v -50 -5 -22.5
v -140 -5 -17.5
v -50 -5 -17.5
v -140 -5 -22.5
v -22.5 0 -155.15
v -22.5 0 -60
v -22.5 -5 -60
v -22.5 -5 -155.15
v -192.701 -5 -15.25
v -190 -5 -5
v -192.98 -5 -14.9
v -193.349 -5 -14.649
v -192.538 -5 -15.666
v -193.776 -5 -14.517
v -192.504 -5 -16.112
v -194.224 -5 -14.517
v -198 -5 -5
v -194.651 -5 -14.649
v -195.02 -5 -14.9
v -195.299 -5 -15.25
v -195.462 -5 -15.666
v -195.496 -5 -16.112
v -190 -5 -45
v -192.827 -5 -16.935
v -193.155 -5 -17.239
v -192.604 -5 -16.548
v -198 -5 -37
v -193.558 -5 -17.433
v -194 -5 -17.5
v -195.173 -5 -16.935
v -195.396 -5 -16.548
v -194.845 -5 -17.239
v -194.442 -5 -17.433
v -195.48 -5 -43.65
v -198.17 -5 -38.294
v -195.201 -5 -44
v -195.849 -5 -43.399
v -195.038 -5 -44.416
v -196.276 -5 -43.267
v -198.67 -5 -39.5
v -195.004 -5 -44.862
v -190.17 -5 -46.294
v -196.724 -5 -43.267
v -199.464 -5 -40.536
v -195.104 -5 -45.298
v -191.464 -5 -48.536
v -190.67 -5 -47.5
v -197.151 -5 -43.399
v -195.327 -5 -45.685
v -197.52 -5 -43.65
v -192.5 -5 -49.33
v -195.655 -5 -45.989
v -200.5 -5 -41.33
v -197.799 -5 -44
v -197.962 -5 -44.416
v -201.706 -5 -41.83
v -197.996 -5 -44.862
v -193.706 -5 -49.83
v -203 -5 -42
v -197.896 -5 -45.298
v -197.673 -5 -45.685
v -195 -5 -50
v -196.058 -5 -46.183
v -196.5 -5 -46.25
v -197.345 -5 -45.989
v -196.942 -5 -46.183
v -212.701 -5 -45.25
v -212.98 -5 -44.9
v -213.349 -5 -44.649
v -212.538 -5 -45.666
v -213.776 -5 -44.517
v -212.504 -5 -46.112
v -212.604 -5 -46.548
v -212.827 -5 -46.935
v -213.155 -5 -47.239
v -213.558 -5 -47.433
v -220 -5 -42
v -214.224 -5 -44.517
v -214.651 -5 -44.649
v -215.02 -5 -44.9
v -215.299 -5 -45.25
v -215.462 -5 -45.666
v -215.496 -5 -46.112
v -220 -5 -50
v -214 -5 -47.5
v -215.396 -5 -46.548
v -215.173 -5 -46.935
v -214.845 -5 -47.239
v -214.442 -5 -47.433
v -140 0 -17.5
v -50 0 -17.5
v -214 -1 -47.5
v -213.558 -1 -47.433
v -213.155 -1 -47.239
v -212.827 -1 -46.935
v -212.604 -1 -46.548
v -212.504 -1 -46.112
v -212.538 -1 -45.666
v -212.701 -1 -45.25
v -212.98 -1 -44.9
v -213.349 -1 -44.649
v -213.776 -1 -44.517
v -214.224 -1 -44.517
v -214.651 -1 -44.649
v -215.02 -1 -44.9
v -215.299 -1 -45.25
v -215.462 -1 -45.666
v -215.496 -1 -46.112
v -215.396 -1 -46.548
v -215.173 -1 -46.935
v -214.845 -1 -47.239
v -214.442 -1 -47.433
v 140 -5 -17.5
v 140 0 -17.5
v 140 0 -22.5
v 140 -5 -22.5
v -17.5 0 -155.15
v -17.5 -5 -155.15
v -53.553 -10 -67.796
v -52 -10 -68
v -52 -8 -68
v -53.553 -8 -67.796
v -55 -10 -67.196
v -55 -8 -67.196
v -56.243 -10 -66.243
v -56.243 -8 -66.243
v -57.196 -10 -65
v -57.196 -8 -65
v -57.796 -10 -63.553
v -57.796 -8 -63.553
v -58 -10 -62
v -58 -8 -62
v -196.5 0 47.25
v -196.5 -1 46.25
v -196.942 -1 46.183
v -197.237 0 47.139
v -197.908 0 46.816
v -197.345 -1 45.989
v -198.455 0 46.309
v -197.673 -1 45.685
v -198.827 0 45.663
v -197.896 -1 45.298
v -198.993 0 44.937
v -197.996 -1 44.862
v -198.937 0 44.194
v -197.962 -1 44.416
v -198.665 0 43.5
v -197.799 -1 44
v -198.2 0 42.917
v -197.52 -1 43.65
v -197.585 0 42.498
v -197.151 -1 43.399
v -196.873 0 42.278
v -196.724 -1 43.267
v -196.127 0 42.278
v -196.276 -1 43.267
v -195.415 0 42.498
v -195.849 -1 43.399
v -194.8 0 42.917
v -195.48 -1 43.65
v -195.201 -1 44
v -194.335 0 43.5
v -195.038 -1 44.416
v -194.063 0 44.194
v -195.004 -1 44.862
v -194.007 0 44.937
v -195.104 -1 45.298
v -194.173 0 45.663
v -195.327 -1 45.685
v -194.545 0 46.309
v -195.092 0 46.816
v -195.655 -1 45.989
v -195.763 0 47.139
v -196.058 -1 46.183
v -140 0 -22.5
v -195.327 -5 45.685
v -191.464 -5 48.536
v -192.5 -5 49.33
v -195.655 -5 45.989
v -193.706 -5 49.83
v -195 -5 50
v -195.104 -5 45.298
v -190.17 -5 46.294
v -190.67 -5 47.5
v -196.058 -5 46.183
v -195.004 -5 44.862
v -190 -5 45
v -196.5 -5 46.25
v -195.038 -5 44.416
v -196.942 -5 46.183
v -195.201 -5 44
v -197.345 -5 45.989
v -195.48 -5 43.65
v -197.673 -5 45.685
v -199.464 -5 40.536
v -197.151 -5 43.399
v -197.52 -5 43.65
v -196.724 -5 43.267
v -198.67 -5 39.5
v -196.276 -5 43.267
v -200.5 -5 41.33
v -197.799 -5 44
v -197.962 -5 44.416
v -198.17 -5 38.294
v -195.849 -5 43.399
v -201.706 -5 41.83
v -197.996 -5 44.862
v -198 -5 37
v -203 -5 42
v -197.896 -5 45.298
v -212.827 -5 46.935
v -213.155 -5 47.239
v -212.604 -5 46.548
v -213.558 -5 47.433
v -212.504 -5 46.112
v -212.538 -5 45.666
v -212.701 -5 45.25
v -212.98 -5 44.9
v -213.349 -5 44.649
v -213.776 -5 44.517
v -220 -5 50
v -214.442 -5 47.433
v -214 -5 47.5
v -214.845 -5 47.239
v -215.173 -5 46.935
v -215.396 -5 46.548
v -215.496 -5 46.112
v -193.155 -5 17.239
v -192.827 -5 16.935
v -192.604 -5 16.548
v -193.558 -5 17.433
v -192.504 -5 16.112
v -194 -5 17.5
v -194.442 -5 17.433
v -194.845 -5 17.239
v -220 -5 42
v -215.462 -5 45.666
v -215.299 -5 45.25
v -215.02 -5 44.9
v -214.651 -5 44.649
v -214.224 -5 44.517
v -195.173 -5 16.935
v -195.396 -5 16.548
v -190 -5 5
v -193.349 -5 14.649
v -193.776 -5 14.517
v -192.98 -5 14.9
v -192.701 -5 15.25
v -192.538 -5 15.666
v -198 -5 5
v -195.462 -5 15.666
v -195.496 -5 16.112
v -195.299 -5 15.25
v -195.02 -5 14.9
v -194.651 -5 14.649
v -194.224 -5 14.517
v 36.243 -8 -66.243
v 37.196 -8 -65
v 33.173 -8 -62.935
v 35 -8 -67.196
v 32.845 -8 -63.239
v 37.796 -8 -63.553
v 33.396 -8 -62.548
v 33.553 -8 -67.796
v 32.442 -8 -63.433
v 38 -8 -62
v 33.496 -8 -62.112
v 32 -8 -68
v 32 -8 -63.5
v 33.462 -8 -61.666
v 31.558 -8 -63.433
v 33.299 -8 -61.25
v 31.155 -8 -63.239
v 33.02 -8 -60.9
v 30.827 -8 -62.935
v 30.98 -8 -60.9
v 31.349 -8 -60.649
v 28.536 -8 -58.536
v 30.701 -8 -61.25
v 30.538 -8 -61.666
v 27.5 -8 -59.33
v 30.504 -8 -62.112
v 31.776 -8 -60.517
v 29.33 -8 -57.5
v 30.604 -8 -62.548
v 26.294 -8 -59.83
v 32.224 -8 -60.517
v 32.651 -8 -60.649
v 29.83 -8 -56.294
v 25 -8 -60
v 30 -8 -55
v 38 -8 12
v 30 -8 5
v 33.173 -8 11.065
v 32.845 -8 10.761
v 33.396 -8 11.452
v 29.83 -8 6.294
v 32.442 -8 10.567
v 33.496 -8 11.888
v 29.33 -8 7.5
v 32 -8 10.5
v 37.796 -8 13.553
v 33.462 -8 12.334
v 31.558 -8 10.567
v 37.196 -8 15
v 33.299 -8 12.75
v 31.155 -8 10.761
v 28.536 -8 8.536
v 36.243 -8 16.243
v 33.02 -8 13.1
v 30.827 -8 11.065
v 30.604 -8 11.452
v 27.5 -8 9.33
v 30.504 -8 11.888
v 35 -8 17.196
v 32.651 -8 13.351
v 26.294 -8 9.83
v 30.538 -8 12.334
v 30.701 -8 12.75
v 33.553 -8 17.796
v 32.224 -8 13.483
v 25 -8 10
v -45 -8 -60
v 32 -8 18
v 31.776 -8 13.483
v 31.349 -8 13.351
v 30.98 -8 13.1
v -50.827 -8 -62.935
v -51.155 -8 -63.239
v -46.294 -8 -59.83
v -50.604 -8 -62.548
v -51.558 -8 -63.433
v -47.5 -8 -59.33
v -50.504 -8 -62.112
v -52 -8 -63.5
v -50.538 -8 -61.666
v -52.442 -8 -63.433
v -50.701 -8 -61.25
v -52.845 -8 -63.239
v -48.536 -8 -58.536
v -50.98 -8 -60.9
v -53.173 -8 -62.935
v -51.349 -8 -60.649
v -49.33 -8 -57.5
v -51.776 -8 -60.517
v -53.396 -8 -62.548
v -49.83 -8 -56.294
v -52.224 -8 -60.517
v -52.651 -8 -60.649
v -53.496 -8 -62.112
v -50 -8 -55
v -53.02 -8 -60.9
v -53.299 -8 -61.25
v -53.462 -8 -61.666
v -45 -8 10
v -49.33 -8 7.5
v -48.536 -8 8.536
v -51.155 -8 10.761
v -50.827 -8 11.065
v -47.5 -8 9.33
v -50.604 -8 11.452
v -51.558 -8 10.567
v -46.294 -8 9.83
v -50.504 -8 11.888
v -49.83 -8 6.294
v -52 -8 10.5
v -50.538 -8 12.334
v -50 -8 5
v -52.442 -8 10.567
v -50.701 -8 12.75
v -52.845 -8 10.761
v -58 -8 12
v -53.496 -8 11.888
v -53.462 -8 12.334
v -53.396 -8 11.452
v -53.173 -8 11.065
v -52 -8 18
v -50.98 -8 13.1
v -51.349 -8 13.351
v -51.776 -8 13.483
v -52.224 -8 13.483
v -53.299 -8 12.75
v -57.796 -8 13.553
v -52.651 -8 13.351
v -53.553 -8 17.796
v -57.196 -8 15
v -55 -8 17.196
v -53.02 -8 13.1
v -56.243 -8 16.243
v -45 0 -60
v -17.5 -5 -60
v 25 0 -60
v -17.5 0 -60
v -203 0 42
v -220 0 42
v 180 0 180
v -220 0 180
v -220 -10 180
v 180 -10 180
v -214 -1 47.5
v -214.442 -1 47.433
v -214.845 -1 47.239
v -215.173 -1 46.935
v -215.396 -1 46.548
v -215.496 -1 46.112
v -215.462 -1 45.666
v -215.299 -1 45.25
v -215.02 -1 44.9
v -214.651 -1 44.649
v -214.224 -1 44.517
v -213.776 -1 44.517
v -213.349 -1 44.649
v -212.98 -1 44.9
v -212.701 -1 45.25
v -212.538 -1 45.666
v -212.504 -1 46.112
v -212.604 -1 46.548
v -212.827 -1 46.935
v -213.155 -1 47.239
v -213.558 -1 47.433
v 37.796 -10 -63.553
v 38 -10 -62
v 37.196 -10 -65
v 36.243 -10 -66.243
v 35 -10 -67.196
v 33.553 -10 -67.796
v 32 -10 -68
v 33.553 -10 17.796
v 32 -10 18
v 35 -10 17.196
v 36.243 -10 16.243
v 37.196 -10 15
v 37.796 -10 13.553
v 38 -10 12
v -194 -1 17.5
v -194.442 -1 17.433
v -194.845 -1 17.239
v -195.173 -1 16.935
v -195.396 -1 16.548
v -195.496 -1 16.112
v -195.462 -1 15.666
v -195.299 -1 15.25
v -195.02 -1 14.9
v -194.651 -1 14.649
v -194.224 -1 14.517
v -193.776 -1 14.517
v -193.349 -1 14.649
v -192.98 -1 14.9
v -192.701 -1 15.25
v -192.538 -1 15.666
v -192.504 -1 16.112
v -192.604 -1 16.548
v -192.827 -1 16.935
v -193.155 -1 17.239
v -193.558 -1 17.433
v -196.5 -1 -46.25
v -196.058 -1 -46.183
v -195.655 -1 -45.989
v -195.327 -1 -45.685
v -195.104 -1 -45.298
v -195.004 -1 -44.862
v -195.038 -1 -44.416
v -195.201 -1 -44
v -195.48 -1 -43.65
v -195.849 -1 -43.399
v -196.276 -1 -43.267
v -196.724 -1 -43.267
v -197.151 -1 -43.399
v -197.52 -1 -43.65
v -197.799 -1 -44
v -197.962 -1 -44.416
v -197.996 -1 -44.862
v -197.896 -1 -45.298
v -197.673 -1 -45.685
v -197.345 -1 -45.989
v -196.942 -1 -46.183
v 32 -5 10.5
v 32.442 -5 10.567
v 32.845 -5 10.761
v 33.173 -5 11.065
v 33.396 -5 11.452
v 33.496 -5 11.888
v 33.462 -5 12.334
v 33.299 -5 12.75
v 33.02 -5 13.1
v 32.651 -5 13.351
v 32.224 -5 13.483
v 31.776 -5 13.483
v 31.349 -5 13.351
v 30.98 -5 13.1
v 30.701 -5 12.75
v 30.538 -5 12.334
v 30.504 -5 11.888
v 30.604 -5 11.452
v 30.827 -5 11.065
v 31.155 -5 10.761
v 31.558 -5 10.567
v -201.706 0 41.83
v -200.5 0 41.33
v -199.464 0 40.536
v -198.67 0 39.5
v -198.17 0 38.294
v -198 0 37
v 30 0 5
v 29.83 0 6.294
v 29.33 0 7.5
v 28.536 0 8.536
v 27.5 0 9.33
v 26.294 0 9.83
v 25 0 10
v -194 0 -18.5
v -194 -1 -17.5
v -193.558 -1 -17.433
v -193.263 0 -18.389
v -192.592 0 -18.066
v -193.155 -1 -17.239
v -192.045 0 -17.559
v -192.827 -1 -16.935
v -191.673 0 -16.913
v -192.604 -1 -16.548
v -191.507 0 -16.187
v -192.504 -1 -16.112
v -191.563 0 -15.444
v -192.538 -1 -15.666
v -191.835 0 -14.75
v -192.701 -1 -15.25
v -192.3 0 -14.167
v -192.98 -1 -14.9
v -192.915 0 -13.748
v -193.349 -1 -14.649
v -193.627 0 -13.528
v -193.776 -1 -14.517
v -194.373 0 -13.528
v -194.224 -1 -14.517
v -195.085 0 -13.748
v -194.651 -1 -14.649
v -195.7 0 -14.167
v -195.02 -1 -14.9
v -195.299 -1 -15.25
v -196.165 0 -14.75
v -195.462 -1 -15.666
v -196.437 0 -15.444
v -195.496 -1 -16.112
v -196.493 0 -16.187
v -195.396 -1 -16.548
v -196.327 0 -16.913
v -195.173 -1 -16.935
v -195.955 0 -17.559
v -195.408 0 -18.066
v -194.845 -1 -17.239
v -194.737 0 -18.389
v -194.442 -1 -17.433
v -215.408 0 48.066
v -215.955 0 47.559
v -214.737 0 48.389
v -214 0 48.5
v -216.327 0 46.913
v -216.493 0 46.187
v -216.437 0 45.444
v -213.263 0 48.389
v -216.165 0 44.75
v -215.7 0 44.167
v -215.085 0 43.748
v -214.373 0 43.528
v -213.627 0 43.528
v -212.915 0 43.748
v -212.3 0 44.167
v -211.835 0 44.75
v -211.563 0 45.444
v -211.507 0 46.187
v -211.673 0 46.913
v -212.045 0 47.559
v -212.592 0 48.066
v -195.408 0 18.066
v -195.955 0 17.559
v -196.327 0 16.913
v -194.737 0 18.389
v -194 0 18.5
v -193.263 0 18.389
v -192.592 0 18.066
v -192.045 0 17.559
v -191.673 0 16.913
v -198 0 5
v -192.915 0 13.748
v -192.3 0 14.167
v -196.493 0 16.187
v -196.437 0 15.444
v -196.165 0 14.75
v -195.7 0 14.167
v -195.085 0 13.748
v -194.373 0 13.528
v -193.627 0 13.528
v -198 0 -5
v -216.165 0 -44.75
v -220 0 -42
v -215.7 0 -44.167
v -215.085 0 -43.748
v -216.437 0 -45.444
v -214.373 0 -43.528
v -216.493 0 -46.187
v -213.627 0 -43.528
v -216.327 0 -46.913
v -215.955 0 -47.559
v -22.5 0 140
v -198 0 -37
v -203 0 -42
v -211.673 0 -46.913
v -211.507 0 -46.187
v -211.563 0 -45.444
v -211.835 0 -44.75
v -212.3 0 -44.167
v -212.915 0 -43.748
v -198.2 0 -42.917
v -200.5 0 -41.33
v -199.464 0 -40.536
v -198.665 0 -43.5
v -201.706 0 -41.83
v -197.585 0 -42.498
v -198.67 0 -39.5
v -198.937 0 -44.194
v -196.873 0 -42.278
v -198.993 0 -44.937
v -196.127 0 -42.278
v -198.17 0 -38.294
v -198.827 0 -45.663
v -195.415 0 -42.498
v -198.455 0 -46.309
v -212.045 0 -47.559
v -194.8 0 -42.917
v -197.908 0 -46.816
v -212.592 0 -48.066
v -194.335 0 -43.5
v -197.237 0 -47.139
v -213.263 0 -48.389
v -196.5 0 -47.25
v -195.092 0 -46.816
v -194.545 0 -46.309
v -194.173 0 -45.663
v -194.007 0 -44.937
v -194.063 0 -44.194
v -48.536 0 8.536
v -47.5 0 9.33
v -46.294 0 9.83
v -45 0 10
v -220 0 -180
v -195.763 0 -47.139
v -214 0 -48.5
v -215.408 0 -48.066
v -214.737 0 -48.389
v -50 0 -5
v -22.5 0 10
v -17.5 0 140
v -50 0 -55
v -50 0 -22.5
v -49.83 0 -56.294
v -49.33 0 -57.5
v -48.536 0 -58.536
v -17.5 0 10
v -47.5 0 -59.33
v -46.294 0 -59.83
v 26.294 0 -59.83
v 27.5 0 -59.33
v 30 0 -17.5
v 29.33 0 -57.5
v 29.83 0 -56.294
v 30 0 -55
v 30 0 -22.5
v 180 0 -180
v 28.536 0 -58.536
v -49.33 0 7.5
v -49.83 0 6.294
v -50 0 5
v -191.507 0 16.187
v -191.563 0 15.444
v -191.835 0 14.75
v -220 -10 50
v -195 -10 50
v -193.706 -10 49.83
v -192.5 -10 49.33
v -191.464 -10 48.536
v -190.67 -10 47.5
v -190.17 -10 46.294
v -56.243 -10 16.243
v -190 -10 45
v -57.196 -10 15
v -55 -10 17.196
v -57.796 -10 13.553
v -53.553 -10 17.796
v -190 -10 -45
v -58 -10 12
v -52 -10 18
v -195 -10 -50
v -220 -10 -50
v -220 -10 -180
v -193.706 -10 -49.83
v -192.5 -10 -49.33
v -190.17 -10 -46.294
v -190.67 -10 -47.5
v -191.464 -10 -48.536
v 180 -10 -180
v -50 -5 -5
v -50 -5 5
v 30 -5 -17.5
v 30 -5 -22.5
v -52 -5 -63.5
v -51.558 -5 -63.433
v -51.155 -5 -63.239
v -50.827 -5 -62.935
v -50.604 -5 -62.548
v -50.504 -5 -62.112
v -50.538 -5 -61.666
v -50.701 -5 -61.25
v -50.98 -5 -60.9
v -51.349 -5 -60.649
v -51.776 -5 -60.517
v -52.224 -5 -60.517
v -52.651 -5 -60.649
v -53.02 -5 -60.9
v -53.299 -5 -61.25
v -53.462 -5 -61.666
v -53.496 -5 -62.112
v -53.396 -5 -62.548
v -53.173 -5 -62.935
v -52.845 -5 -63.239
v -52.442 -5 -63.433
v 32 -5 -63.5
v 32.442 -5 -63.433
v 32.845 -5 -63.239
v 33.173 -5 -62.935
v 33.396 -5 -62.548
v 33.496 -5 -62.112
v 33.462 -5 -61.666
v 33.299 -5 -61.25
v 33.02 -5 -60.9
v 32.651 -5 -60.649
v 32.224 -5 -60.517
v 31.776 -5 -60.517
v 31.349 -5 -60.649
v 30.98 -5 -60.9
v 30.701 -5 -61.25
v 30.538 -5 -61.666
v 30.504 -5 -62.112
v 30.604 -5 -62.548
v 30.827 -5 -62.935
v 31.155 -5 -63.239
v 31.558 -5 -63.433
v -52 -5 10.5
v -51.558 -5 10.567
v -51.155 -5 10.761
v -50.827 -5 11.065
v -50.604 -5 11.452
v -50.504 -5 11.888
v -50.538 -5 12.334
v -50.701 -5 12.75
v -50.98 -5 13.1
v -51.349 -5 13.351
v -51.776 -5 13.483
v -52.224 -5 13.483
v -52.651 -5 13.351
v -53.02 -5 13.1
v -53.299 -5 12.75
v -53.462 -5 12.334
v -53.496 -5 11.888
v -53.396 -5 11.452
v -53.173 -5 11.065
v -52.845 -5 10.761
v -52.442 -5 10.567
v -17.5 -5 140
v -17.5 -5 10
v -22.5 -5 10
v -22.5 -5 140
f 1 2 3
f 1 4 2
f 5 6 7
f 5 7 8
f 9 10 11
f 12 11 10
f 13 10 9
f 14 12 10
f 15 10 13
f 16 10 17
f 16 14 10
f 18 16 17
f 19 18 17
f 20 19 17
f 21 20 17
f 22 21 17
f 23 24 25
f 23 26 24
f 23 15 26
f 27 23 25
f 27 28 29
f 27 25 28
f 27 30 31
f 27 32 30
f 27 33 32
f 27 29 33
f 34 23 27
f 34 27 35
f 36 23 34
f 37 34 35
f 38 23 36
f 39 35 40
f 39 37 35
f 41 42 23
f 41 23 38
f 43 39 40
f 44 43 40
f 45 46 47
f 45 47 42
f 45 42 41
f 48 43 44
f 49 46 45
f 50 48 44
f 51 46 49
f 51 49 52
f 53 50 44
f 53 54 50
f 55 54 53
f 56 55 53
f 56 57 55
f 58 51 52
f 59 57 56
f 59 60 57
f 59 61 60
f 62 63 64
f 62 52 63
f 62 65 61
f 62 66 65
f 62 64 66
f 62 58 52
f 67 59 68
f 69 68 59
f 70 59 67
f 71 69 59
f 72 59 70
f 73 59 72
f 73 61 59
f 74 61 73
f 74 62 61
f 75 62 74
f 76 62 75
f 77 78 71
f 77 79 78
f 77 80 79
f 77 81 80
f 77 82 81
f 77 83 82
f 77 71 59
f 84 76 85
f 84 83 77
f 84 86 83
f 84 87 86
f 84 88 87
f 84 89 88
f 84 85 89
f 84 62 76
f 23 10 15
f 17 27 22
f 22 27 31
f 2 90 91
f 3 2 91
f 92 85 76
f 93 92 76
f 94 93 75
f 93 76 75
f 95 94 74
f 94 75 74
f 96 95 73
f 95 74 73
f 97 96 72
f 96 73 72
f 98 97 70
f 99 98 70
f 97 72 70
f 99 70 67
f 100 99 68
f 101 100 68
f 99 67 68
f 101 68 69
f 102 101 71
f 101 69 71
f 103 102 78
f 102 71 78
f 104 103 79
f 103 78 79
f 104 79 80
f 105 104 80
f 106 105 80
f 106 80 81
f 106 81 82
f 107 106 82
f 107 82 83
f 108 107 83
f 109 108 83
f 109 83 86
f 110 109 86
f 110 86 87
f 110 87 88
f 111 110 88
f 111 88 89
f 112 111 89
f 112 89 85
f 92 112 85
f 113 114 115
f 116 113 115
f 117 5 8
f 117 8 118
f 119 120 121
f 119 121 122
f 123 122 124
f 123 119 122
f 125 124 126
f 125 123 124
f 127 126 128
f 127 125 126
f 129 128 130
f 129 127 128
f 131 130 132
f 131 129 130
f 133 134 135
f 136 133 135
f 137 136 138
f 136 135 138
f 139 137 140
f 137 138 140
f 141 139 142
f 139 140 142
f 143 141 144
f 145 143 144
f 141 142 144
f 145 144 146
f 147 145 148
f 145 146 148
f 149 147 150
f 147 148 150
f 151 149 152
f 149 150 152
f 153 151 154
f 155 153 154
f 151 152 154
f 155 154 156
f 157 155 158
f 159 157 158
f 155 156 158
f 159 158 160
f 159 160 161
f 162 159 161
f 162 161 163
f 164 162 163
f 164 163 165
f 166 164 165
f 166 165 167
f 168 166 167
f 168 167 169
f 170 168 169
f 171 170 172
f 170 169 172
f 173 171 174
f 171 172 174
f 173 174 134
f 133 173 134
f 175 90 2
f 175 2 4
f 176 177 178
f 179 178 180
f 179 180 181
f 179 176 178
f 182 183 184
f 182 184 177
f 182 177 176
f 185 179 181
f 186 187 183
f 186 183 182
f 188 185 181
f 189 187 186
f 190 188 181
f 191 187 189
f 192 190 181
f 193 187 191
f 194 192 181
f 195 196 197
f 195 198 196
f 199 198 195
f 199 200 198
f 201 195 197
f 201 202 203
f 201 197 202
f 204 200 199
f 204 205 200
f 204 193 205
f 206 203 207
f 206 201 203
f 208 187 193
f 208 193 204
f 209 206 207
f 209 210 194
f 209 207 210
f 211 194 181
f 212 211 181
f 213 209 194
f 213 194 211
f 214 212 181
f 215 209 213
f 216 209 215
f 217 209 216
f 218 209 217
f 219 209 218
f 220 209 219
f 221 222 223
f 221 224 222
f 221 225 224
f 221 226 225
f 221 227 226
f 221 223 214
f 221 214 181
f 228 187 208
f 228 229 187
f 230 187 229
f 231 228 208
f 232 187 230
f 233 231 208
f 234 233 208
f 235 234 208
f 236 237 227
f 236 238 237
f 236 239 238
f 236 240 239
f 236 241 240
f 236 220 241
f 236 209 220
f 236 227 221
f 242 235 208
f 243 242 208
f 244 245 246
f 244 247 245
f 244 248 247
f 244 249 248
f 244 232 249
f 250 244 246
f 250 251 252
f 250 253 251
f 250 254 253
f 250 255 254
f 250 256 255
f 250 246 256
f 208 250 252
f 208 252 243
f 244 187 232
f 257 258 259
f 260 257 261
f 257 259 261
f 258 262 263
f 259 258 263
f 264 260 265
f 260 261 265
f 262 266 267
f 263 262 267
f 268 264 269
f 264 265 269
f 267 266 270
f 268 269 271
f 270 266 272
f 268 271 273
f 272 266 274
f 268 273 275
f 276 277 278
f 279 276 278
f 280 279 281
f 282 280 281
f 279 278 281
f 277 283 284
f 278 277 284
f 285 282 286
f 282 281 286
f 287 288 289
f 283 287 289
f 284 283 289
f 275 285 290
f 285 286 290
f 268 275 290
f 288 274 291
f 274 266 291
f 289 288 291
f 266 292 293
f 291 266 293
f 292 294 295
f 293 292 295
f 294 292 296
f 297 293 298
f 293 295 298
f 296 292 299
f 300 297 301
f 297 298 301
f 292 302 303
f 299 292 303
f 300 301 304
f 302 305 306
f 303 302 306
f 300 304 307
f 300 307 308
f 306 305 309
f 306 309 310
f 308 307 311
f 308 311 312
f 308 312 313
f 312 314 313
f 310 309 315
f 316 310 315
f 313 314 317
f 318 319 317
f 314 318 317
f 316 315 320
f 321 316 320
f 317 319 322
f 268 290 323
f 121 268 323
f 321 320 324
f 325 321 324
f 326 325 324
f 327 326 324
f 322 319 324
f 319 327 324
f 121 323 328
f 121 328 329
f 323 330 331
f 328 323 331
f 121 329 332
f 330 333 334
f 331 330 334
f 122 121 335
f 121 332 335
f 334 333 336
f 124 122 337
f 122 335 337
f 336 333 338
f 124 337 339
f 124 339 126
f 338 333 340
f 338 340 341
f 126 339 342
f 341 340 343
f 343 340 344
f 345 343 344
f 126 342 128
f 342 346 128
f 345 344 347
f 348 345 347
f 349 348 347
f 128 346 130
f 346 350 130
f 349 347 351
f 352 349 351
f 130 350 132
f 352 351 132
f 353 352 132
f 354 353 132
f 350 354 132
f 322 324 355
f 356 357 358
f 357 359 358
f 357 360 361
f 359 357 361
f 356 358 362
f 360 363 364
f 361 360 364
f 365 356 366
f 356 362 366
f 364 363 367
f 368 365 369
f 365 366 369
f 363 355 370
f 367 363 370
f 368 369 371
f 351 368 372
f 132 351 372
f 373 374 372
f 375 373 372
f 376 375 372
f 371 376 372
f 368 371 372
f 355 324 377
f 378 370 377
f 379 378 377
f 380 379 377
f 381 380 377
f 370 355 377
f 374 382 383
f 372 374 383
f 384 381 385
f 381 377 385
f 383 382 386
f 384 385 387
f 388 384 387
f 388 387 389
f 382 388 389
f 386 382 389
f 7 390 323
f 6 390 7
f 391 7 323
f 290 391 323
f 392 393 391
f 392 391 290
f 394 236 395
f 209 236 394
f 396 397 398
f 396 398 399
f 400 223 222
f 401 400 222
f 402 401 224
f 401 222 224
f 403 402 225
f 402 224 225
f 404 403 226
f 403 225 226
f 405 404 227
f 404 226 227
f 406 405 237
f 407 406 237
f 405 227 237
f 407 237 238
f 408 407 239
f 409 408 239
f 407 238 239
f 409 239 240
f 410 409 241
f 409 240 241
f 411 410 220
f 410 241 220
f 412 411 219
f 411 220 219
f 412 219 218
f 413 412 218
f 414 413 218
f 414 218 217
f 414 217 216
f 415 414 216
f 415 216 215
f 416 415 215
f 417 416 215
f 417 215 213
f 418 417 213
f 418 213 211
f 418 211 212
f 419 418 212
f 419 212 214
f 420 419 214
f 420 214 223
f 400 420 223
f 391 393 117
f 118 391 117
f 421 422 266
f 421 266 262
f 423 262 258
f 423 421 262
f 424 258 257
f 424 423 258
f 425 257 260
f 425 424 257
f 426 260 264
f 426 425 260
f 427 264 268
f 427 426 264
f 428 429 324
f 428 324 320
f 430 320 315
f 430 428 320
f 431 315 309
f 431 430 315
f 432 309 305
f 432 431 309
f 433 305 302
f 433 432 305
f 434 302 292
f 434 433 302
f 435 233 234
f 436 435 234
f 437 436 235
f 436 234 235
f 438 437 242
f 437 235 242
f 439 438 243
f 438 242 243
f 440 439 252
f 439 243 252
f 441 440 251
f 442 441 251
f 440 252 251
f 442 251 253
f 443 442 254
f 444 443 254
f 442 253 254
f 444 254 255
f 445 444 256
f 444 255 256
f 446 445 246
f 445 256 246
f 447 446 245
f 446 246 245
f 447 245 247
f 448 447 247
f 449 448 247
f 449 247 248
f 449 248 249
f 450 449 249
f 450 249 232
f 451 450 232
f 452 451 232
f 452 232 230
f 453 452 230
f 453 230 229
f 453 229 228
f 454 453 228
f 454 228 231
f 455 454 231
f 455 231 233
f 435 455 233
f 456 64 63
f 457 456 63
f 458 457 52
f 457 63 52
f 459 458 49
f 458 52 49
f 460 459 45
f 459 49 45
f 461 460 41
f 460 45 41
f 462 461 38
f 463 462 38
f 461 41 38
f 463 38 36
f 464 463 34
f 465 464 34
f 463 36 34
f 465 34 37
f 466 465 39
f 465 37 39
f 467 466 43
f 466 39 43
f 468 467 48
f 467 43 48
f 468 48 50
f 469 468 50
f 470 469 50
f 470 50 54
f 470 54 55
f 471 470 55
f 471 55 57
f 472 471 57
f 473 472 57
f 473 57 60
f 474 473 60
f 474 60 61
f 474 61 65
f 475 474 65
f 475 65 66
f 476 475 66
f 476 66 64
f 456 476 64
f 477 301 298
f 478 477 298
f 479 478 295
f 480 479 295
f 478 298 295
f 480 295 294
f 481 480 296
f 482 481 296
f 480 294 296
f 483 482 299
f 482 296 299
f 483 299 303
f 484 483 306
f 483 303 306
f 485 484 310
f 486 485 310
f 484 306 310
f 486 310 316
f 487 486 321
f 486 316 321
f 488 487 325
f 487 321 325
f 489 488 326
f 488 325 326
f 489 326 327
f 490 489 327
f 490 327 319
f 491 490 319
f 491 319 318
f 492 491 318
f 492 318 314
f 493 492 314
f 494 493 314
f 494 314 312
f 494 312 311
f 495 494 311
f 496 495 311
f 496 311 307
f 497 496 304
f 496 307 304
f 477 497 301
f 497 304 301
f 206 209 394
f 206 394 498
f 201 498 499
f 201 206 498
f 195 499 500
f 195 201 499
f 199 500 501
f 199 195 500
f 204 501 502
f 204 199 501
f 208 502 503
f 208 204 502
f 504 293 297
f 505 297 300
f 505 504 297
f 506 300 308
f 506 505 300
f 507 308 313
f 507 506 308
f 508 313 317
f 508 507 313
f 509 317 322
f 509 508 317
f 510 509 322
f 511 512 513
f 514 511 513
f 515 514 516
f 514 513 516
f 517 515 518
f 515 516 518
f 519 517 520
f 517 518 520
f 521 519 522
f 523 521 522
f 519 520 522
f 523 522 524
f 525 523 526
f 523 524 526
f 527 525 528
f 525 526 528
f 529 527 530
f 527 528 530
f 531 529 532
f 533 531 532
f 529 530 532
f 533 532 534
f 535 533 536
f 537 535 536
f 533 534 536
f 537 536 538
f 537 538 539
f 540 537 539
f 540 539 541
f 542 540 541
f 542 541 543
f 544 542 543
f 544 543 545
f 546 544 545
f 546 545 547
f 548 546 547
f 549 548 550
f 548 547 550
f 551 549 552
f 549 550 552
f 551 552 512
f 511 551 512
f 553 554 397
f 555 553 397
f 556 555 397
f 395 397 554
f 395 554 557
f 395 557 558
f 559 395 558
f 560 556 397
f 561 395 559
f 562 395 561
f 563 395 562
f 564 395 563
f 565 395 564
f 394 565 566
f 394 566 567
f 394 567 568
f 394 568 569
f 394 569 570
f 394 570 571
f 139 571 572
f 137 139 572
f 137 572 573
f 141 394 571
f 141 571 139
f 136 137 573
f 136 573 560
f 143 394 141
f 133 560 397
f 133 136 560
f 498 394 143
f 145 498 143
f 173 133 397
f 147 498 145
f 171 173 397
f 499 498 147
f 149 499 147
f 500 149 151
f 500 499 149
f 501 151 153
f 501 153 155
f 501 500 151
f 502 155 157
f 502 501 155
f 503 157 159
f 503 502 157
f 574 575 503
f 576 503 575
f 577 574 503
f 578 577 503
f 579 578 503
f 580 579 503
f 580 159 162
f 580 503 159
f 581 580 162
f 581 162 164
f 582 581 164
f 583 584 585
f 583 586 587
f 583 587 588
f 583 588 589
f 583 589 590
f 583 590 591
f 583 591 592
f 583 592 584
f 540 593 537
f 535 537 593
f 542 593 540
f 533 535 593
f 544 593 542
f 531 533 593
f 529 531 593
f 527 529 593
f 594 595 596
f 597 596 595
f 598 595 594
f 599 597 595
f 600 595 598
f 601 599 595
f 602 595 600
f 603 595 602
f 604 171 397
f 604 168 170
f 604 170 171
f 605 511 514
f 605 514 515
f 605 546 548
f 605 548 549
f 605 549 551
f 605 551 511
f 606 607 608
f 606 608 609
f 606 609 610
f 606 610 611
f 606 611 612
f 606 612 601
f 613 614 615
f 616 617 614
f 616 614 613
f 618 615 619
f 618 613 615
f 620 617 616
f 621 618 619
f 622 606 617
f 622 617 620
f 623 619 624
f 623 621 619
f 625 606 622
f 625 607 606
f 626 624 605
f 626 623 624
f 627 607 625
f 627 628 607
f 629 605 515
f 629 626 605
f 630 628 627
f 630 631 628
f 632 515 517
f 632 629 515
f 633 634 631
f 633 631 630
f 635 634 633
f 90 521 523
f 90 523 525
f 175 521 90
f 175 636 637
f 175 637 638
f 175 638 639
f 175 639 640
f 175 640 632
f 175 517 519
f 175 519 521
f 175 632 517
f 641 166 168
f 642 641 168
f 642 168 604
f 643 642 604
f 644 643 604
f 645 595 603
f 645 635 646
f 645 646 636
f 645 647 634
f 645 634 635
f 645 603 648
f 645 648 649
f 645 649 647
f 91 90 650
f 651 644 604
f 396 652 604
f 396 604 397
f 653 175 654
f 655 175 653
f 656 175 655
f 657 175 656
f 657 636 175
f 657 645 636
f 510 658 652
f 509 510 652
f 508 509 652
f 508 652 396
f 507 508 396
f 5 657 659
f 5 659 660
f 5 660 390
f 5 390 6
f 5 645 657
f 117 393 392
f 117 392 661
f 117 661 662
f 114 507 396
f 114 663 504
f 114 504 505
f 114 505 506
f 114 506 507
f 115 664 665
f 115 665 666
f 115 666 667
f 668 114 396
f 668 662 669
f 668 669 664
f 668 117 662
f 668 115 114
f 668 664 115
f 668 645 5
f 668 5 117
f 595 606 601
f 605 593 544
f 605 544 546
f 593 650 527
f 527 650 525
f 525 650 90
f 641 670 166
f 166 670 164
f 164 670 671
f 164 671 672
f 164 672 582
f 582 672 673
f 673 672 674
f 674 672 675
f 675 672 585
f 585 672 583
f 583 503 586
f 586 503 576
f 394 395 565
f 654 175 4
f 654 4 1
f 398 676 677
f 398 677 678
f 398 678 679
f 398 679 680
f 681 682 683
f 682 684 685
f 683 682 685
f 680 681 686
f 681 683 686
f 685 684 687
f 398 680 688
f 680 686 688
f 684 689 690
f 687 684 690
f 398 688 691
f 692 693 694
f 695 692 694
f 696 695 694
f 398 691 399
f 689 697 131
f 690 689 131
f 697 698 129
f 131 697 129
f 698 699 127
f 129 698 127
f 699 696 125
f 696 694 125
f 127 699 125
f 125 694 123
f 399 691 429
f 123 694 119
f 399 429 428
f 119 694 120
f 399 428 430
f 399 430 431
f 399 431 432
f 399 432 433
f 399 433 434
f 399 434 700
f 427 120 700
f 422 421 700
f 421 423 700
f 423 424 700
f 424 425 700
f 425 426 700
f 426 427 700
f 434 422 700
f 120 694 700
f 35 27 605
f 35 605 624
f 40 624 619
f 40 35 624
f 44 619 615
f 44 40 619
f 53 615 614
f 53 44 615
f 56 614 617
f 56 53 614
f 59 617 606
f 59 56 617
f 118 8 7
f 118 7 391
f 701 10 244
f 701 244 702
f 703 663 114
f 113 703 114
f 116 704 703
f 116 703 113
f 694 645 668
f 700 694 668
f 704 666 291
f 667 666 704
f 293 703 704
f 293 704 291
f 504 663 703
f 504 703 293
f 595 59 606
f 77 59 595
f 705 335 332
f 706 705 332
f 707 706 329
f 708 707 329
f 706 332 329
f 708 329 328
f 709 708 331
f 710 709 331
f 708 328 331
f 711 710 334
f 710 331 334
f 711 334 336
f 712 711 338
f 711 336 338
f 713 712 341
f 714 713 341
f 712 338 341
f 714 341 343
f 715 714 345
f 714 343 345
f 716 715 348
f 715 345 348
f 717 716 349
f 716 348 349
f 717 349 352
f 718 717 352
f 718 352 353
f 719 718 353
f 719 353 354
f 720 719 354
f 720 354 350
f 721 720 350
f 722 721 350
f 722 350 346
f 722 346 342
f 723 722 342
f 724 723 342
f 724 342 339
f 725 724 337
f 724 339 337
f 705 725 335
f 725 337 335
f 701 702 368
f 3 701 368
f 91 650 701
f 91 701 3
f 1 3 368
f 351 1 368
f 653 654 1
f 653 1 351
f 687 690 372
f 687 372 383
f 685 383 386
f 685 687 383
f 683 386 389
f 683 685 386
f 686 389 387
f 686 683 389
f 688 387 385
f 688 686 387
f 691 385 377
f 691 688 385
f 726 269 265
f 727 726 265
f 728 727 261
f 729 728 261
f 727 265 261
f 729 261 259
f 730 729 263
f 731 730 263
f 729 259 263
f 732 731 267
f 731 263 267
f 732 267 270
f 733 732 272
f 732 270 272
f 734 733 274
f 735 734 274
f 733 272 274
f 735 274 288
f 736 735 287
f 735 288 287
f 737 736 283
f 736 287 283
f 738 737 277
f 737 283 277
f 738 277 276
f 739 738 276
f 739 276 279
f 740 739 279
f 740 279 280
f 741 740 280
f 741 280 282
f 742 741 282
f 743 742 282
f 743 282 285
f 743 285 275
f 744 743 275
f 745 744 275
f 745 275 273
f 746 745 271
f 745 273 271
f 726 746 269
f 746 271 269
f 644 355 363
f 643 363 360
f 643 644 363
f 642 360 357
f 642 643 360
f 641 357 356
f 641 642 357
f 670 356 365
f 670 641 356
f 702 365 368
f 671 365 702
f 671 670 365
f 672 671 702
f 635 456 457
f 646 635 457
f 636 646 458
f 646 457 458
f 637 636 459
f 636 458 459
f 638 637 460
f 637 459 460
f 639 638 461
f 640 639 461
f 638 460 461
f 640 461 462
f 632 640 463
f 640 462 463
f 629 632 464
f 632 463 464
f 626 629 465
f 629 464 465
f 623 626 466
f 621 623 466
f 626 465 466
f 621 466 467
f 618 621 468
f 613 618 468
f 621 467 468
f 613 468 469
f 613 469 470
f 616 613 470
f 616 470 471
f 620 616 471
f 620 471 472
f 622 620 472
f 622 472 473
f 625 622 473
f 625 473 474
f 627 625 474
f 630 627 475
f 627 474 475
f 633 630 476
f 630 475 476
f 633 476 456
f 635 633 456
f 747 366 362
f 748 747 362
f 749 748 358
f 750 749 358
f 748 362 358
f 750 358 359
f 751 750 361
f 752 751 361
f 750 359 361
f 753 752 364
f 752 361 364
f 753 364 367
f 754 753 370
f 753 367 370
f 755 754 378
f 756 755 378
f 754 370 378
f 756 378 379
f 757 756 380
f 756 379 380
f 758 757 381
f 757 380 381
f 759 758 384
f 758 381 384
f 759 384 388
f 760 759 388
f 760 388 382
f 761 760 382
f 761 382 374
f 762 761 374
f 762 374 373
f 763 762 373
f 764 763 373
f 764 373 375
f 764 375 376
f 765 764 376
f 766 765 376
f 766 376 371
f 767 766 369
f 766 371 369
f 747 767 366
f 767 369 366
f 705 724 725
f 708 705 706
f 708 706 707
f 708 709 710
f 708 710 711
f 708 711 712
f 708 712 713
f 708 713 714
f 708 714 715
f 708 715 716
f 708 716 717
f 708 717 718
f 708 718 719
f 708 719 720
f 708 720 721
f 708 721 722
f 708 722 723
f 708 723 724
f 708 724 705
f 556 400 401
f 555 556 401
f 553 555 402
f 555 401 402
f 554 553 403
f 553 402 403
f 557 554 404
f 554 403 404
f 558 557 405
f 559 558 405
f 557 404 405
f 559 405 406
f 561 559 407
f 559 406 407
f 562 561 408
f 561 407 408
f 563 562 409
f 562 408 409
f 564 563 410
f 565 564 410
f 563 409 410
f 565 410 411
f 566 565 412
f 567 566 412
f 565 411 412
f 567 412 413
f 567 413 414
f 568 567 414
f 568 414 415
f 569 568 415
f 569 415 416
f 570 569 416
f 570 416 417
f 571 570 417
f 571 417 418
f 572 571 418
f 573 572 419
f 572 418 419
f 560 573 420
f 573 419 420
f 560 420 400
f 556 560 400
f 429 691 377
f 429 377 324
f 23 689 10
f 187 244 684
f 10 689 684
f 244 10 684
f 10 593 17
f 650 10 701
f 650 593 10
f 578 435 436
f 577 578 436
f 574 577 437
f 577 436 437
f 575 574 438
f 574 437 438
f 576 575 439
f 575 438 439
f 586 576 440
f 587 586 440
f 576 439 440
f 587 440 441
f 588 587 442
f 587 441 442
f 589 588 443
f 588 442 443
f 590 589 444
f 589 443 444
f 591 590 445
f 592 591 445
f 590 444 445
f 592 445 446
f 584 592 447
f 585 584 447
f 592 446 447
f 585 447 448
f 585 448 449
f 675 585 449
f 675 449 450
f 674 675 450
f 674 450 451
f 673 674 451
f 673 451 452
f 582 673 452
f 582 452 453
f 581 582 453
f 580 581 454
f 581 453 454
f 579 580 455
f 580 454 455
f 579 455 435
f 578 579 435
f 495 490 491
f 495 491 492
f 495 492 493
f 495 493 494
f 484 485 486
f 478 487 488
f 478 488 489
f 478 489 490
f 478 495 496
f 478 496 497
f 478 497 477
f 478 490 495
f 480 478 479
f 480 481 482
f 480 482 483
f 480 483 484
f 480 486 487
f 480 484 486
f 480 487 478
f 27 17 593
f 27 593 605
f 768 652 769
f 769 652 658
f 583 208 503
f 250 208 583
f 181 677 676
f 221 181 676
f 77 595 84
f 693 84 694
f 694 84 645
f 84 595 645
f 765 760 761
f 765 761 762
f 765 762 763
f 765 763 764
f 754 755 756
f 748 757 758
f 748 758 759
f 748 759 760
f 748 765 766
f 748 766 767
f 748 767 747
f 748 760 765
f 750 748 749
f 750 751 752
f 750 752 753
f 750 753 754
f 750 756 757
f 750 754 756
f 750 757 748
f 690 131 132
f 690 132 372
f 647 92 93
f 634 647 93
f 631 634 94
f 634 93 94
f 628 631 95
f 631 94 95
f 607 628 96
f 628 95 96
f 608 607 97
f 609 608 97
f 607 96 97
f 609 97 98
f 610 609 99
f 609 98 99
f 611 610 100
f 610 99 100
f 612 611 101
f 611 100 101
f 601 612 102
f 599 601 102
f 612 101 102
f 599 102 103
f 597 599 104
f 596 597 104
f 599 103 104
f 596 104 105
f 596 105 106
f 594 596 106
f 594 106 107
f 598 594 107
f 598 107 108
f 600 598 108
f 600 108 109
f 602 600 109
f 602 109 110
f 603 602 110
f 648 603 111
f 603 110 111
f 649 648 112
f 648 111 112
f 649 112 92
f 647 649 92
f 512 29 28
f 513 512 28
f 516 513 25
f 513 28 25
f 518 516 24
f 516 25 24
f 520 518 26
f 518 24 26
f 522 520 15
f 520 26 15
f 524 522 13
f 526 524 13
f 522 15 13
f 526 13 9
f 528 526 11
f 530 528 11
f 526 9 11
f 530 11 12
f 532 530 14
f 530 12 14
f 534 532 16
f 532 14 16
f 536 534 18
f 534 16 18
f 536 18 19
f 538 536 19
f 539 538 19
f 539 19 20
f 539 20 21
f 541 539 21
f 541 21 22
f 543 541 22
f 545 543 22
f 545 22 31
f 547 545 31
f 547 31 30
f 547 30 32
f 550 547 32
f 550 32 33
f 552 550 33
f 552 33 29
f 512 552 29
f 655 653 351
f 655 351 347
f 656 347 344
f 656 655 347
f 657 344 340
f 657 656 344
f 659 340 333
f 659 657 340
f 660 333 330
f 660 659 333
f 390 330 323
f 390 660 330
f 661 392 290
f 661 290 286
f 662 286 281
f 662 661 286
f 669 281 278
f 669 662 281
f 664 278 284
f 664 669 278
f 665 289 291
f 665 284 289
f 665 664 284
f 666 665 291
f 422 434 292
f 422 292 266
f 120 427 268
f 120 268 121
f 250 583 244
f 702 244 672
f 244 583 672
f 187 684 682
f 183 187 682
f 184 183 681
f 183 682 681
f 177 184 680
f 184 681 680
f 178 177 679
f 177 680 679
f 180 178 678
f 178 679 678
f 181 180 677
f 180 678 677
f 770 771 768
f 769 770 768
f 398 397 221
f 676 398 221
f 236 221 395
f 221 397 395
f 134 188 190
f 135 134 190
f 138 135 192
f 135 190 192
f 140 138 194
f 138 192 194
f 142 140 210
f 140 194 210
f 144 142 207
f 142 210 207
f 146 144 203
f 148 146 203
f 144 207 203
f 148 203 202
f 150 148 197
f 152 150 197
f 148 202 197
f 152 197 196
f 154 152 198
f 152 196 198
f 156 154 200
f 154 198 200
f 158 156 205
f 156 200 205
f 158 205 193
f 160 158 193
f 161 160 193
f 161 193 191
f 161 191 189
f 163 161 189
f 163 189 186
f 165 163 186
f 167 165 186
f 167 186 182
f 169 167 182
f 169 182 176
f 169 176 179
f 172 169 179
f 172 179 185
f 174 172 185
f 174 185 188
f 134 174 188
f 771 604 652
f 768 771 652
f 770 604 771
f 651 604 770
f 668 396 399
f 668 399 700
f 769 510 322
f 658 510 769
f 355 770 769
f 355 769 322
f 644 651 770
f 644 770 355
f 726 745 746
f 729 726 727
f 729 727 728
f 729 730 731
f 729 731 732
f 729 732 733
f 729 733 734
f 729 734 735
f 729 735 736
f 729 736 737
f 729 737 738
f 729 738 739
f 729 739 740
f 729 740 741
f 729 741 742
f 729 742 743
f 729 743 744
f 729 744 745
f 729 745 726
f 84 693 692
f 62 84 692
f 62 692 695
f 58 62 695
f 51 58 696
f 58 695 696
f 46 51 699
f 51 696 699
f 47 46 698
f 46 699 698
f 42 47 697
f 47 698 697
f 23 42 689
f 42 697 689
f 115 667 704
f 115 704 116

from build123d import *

# Parameters (mm, degrees)
SKETCH1_W           = 400
SKETCH1_H           = 360
BOSS_EXTRUDE1_DEPTH = 10
CUT_EXTRUDE1_DEPTH  = 285.429253067
CUT_EXTRUDE2_DEPTH  = 2
SKETCH5_R           = 1.5
CUT_EXTRUDE3_DEPTH  = 3
CUT_EXTRUDE6_DEPTH  = 5
CUT_EXTRUDE7_DEPTH  = 5
SKETCH11_R          = 1.5
CUT_EXTRUDE8_DEPTH  = 285.297379517
SKETCH14_W          = 160
SKETCH14_H          = 10
CUT_EXTRUDE9_DEPTH  = 5
SKETCH15_W          = 5
SKETCH15_H          = 295.150358454
SKETCH15_W_2        = 280
SKETCH15_H_2        = 5
CUT_EXTRUDE10_DEPTH = 5
CHAMFER2_SIZE       = 1


with BuildPart() as part:
    # Sketch1 → Boss-Extrude1 (new body)
    with BuildSketch(Plane(origin=(0, 0, 0), x_dir=(1, 0, 0), z_dir=(0, 1, 0))):
        with Locations((-20, 0)):
            Rectangle(SKETCH1_W, SKETCH1_H)
    extrude(amount=-BOSS_EXTRUDE1_DEPTH)

    # Sketch3 → Cut-Extrude1 (cut, through all)
    with BuildSketch(Plane(origin=(0, 0, 0), x_dir=(1, 0, 0), z_dir=(0, 1, 0))):
        with BuildLine():
            Line((-45, 60), (25, 60))
            ThreePointArc((25, 60), (28.535533906, 58.535533906), (30, 55))
            Line((30, 55), (30, -5))
            ThreePointArc((30, -5), (28.535533906, -8.535533906), (25, -10))
            Line((25, -10), (-45, -10))
            ThreePointArc((-45, -10), (-48.535533906, -8.535533906), (-50, -5))
            Line((-50, -5), (-50, 55))
            ThreePointArc((-50, 55), (-48.535533906, 58.535533906), (-45, 60))
        make_face()
    extrude(amount=-CUT_EXTRUDE1_DEPTH, mode=Mode.SUBTRACT)

    # Sketch4 → Cut-Extrude2 (cut)
    with BuildSketch(Plane.XZ.offset(10)):
        with BuildLine():
            Line((-52, 18), (32, 18))
            ThreePointArc((32, 18), (36.242640687, 16.242640687), (38, 12))
            Line((38, 12), (38, -62))
            ThreePointArc((38, -62), (36.242640687, -66.242640687), (32, -68))
            Line((32, -68), (-52, -68))
            ThreePointArc((-52, -68), (-56.242640687, -66.242640687), (-58, -62))
            Line((-58, -62), (-58, 12))
            ThreePointArc((-58, 12), (-56.242640687, 16.242640687), (-52, 18))
        make_face()
    extrude(amount=-CUT_EXTRUDE2_DEPTH, mode=Mode.SUBTRACT)

    # Sketch5 → Cut-Extrude3 (cut)
    with BuildSketch(Plane.XZ.offset(8)):
        with Locations(Location((32, 12, 0), (0, 0, 270))):
            Circle(SKETCH5_R)
        with Locations(Location((-52, 12, 0), (0, 0, 270))):
            Circle(SKETCH5_R)
        with Locations(Location((32, -62, 0), (0, 0, 270))):
            Circle(SKETCH5_R)
        with Locations(Location((-52, -62, 0), (0, 0, 270))):
            Circle(SKETCH5_R)
    extrude(amount=-CUT_EXTRUDE3_DEPTH, mode=Mode.SUBTRACT)

    # Sketch9 → Cut-Extrude6 (cut)
    with BuildSketch(Plane(origin=(0, -10, 0), x_dir=(1, 0, 0), z_dir=(0, 1, 0))):
        with BuildLine():
            Line((-220, 50), (-195, 50))
            ThreePointArc((-195, 50), (-191.464466094, 48.535533906), (-190, 45))
            Line((-190, 45), (-190, -45))
            ThreePointArc((-190, -45), (-191.464466094, -48.535533906), (-195, -50))
            Line((-195, -50), (-220, -50))
            Line((-220, -50), (-220, 50))
        make_face()
    extrude(amount=CUT_EXTRUDE6_DEPTH, mode=Mode.SUBTRACT)

    # Sketch10 → Cut-Extrude7 (cut)
    with BuildSketch(Plane(origin=(0, -5, 0), x_dir=(-1, 0, 0), z_dir=(0, -1, 0))):
        with BuildLine():
            Line((220, 42), (220, -42))
            Line((220, -42), (203, -42))
            ThreePointArc((203, -42), (199.464466094, -40.535533906), (198, -37))
            Line((198, -37), (198, 37))
            ThreePointArc((198, 37), (199.464466094, 40.535533906), (203, 42))
            Line((203, 42), (220, 42))
        make_face()
    extrude(amount=-CUT_EXTRUDE7_DEPTH, mode=Mode.SUBTRACT)

    # Sketch11 → Cut-Extrude8 (cut, through all)
    with BuildSketch(Plane(origin=(0, -5, 0), x_dir=(-1, 0, 0), z_dir=(0, -1, 0))):
        with Locations(Location((214, 46, 0), (0, 0, 90))):
            Circle(SKETCH11_R)
        with Locations(Location((194, 16, 0), (0, 0, 90))):
            Circle(SKETCH11_R)
        with Locations(Location((196.5, 44.75, 0), (0, 0, 90))):
            Circle(SKETCH11_R)
        with Locations(Location((196.5, -44.75, 0), (0, 0, 270))):
            Circle(SKETCH11_R)
        with Locations(Location((194, -16, 0), (0, 0, 270))):
            Circle(SKETCH11_R)
        with Locations(Location((214, -46, 0), (0, 0, 270))):
            Circle(SKETCH11_R)
    extrude(amount=-CUT_EXTRUDE8_DEPTH, mode=Mode.SUBTRACT)

    # Sketch14 → Cut-Extrude9 (cut)
    with BuildSketch(Plane(origin=(0, 0, 0), x_dir=(1, 0, 0), z_dir=(0, 1, 0))):
        with Locations((-118, 0)):
            Rectangle(SKETCH14_W, SKETCH14_H)
    extrude(amount=-CUT_EXTRUDE9_DEPTH, mode=Mode.SUBTRACT)

    # Sketch15 → Cut-Extrude10 (cut)
    with BuildSketch(Plane(origin=(0, 0, 0), x_dir=(1, 0, 0), z_dir=(0, 1, 0))):
        with Locations((-20, 7.575179227)):
            Rectangle(SKETCH15_W, SKETCH15_H)
        with Locations((0, 20)):
            Rectangle(SKETCH15_W_2, SKETCH15_H_2)
    extrude(amount=-CUT_EXTRUDE10_DEPTH, mode=Mode.SUBTRACT)

    # Chamfer2
    chamfer2_edges = [part.edges().sort_by_distance(p)[0] for p in [
        (-214, 0, 44.5),
        (-194, 0, 14.5),
        (-196.5, 0, 43.25),
        (-196.5, 0, -43.25),
        (-194, 0, -14.5),
        (-214, 0, -44.5),
    ]]
    chamfer(chamfer2_edges, length=CHAMFER2_SIZE)


solid = part.part
